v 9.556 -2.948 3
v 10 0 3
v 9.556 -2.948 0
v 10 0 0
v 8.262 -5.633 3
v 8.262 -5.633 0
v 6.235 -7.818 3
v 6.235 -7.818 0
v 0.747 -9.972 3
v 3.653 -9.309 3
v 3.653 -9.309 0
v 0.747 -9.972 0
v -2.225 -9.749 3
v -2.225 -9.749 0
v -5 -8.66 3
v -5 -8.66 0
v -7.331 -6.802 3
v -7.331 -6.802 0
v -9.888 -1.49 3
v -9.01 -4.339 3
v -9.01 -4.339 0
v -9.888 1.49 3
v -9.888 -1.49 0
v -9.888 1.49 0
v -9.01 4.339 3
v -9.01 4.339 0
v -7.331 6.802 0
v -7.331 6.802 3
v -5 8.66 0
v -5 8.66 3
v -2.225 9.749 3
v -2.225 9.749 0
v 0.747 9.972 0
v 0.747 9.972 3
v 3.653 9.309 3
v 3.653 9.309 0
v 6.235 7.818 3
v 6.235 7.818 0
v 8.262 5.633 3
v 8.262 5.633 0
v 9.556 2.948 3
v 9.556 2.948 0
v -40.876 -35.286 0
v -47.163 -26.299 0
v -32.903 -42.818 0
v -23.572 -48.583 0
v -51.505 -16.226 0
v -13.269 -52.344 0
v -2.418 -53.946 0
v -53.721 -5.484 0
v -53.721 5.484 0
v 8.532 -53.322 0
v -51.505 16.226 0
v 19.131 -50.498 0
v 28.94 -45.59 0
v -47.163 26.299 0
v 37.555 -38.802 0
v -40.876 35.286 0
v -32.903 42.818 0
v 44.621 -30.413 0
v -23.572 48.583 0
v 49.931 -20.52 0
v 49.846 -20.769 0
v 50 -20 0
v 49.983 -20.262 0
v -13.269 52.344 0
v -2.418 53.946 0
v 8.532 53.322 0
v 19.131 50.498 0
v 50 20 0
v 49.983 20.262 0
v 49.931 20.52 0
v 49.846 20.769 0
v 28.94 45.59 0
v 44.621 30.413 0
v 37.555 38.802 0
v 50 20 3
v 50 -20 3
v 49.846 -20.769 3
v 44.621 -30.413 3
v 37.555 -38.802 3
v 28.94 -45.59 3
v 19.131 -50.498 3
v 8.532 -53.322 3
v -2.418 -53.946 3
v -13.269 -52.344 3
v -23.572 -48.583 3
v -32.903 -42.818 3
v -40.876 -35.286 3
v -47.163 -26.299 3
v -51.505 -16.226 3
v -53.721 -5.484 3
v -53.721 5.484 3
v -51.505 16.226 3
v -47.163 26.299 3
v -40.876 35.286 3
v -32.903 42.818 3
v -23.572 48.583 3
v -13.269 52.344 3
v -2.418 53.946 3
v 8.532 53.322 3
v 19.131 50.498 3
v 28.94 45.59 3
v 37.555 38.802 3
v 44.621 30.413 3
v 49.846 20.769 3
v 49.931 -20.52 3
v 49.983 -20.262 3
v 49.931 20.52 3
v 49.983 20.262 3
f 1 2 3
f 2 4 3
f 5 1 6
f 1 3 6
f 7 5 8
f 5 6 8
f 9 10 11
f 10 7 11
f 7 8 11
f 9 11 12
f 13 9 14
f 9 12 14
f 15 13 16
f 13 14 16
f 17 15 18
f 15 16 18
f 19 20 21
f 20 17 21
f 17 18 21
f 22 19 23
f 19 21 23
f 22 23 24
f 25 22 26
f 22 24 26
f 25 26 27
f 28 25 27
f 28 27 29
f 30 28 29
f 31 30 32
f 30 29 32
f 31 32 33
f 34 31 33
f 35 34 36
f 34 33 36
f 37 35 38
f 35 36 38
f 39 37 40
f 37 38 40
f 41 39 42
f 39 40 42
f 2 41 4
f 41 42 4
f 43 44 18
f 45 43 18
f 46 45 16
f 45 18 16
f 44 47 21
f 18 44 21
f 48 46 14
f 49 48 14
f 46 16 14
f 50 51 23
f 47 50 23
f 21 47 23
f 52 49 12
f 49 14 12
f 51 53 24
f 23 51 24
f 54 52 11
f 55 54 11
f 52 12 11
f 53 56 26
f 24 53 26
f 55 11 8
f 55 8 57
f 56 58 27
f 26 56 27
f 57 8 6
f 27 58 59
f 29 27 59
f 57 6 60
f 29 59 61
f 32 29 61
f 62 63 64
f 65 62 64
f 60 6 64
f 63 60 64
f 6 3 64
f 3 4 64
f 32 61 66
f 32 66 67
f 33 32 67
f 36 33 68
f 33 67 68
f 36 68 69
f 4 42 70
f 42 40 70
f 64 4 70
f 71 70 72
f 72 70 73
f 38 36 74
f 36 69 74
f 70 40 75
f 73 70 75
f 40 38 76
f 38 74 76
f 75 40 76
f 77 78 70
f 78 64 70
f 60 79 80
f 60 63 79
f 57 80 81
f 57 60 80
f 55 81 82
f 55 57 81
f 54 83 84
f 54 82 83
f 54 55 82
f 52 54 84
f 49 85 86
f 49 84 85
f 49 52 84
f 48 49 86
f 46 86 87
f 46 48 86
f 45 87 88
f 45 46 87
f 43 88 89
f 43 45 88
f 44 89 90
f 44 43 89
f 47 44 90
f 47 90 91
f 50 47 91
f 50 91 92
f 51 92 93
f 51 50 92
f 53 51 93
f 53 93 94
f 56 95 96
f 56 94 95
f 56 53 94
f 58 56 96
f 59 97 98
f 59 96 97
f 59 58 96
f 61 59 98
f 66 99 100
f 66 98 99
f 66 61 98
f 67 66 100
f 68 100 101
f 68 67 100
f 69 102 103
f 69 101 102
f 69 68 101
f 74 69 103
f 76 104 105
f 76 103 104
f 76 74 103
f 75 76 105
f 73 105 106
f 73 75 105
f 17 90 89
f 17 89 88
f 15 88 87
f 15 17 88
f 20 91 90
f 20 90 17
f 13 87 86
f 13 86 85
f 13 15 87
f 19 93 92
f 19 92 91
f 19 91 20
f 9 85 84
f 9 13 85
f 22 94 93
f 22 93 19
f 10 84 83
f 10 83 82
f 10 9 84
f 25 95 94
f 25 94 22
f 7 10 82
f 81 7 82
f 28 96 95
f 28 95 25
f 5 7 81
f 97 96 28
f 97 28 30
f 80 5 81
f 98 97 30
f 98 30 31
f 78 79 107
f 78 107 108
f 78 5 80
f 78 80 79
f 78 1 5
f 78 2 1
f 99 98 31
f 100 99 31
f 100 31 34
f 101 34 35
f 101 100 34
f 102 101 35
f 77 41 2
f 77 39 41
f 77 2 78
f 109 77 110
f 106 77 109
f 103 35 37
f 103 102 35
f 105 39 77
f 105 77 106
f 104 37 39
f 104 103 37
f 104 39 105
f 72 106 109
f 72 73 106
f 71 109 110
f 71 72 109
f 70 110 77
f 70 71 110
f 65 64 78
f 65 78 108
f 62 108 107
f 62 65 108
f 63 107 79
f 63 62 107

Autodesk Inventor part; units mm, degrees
ref_plane "YZ Plane" through (0, 0, 0) normal (1, 0, 0) x (0, 1, 0)
ref_plane "XZ Plane" through (0, 0, 0) normal (0, 1, 0) x (-1, 0, 0)
ref_plane "XY Plane" through (0, 0, 0) normal (0, 0, 1) x (1, 0, 0)
sketch "Sketch1" plane through (0, 0, 0) normal (0, 0, 1) x (1, 0, 0)
  circle A0 centre (0, 0) radius 10
  line L0 (50, -20) -> (50, 20)
  arc A1 (49.8462, 20.7692) -> (49.8462, -20.7692) centre (0, 0) ccw
  arc A2 (50, 20) -> (49.8462, 20.7692) centre (48, 20) ccw
  arc A3 (49.8462, -20.7692) -> (50, -20) centre (48, -20) ccw
  point P0 (50, -20.3961)
  point P1 (50, 20.3961)
  dimension "d1" = 20
  dimension "d12" = 50
  dimension "d14" = 54
extrude "Extrusion3" add sketch "Sketch1" along normal blind 3
properties part number "EndCap 108 Cover"
